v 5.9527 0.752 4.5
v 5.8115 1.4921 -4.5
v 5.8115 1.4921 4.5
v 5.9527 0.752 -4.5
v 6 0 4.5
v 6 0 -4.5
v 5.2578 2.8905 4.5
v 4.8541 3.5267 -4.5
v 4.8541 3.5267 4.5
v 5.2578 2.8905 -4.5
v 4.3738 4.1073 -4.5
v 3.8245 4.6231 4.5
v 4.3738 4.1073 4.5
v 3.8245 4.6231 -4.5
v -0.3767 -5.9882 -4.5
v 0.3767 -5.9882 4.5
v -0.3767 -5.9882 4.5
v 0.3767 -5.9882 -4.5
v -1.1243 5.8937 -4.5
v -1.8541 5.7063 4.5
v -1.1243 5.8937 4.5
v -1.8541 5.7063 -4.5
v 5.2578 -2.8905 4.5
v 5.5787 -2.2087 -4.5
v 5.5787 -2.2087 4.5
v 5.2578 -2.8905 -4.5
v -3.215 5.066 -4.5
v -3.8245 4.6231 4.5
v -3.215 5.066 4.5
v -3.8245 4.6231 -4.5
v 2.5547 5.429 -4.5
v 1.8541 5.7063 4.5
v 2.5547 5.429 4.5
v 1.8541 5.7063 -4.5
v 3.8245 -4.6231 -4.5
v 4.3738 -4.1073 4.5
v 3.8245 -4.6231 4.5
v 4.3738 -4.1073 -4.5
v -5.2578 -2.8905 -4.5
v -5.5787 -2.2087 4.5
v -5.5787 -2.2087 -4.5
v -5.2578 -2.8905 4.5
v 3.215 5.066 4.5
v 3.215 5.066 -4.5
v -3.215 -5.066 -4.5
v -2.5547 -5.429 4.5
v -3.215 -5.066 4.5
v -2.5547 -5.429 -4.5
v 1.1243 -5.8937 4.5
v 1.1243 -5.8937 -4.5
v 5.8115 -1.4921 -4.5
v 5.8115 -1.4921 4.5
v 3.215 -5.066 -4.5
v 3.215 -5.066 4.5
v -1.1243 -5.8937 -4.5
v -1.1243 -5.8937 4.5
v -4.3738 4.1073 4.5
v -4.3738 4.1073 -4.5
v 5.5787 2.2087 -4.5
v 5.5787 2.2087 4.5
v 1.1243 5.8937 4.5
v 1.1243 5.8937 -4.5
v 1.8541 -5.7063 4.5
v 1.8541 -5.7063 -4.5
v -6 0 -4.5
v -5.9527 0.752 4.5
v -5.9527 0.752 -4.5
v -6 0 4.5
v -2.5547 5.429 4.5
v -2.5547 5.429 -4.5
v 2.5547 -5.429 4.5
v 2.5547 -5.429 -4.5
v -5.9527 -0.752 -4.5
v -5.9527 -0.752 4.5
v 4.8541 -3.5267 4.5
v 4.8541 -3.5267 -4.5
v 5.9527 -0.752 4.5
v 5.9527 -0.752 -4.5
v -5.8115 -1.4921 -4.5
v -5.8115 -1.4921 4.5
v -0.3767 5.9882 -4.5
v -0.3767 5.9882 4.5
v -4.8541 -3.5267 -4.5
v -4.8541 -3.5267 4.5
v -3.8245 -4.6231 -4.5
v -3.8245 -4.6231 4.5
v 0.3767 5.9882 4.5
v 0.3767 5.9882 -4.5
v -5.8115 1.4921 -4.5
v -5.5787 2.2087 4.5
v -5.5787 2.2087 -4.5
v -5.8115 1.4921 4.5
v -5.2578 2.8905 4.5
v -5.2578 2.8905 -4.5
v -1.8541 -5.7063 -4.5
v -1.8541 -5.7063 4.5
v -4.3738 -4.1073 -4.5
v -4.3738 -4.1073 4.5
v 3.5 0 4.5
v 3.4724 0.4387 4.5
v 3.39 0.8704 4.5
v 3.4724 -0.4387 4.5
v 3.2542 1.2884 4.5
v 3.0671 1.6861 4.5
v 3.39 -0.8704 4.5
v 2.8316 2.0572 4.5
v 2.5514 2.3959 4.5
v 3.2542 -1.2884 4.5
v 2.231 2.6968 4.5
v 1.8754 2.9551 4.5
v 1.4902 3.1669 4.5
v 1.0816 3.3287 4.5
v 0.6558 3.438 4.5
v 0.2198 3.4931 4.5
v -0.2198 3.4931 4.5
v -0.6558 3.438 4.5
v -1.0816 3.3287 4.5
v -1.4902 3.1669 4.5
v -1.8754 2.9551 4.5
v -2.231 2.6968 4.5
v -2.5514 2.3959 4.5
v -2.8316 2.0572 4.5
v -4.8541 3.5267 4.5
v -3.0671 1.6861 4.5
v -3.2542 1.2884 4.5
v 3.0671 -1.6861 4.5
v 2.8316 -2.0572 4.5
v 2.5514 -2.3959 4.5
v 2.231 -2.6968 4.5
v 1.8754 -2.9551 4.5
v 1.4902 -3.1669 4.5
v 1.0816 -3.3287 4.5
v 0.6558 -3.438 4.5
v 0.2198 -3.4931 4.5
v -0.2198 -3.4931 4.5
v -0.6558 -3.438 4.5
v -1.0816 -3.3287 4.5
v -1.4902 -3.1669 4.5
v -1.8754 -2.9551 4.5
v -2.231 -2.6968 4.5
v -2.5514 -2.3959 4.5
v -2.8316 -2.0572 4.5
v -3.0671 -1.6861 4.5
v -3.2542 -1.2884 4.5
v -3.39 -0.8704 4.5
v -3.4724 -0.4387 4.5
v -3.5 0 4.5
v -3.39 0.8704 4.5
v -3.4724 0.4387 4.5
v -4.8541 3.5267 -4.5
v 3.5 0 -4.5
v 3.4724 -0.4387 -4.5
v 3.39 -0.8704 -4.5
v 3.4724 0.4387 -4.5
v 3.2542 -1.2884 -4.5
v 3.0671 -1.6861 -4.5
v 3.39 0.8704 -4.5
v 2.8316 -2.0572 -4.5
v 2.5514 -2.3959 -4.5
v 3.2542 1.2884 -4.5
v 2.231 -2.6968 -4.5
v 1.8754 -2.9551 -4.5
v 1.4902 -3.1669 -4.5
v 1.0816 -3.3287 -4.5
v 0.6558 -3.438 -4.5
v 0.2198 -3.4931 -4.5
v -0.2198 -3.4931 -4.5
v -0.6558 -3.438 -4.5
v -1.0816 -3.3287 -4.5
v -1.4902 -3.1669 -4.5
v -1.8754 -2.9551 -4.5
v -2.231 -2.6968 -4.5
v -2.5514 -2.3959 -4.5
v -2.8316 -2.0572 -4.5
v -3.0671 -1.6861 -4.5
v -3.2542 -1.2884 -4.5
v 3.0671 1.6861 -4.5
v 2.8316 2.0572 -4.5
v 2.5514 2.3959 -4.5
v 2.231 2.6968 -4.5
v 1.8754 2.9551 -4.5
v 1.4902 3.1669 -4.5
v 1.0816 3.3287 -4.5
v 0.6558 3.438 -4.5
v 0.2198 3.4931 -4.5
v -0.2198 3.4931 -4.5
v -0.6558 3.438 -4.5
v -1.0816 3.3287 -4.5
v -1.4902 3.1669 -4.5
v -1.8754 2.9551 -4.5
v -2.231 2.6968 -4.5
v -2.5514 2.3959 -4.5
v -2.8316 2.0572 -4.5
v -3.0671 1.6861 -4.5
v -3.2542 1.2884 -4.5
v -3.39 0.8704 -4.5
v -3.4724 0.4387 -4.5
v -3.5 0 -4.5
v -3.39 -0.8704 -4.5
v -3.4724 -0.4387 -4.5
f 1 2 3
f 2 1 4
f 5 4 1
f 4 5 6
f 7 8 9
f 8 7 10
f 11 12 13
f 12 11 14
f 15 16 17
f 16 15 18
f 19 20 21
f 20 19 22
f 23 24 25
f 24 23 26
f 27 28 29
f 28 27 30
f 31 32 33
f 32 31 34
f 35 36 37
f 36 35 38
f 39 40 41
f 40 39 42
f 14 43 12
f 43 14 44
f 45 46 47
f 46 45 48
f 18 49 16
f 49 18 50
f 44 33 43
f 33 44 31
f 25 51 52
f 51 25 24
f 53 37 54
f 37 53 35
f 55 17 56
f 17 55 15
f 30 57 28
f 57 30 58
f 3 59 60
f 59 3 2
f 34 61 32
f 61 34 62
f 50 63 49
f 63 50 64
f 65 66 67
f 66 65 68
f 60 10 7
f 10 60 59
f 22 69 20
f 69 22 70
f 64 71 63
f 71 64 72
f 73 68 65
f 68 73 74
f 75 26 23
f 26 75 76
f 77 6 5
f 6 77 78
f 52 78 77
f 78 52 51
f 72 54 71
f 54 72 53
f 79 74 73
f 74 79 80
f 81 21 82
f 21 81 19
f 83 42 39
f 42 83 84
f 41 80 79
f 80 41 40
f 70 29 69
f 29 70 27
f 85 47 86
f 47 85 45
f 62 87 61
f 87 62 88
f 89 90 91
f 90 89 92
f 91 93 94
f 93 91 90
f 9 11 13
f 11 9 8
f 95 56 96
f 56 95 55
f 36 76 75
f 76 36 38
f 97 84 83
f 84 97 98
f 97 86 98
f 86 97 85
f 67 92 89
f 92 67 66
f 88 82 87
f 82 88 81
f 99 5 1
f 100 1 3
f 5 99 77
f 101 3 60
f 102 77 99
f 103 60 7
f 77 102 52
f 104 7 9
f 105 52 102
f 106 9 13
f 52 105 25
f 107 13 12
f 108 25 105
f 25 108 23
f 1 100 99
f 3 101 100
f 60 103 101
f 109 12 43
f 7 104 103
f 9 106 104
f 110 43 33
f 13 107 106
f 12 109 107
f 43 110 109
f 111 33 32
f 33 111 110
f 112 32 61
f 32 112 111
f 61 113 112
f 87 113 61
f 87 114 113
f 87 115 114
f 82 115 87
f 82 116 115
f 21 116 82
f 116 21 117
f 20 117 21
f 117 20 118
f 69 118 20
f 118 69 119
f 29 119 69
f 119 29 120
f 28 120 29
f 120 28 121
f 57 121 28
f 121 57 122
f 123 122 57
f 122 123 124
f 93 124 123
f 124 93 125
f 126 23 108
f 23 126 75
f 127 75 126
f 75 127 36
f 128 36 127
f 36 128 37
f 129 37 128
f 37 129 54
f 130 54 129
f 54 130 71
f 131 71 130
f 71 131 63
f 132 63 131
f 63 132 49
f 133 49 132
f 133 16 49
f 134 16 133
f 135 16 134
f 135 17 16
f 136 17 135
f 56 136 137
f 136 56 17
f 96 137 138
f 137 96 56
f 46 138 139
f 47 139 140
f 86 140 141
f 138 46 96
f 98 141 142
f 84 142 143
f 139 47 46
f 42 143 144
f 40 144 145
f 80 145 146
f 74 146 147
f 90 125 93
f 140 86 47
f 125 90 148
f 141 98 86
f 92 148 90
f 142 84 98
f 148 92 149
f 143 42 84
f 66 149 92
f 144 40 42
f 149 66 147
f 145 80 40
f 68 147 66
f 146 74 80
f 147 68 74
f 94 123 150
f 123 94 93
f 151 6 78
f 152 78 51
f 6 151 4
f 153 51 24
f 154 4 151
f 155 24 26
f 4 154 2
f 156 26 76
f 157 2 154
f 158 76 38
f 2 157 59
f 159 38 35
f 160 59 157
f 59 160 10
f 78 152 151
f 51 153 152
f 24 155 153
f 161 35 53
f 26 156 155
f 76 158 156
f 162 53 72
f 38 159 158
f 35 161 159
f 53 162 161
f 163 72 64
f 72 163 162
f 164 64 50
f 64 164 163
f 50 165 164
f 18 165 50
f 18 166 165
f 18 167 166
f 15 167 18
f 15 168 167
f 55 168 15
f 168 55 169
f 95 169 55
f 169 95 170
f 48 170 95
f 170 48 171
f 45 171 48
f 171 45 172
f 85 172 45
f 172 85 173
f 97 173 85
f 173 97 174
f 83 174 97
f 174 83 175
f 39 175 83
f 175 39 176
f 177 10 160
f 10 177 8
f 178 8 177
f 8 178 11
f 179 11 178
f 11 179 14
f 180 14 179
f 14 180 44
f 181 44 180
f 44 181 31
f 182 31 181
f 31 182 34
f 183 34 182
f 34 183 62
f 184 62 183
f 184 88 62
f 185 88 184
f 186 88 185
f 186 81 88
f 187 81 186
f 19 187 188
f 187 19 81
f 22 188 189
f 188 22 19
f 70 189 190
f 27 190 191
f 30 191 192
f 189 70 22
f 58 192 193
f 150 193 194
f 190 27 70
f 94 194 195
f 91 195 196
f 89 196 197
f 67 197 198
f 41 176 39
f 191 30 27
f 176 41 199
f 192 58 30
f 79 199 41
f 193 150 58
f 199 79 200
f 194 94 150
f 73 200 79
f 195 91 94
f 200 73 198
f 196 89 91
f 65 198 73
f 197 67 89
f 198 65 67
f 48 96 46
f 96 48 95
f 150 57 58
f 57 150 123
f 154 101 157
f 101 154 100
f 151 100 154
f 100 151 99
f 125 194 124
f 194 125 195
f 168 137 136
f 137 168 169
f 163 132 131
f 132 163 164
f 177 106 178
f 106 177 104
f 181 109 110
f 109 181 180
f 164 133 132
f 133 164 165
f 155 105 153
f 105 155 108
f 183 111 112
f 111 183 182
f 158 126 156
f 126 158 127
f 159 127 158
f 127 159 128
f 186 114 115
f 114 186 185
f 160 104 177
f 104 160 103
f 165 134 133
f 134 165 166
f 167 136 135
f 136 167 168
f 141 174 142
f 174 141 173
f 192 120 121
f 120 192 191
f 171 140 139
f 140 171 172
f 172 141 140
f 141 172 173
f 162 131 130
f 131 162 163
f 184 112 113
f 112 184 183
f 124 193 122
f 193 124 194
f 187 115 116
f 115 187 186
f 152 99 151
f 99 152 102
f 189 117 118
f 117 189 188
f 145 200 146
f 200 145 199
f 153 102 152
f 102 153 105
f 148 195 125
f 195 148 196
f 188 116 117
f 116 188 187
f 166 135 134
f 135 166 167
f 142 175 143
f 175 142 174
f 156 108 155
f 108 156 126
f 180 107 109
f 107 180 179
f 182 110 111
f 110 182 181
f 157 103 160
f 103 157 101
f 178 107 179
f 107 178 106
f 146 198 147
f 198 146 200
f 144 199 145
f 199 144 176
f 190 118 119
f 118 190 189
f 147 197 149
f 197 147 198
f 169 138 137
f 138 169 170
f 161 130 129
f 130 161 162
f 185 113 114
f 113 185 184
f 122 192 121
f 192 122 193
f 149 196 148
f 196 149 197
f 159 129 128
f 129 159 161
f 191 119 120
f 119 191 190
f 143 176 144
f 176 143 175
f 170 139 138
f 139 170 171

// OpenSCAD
$fn = 50;


difference() {
	union() {
		translate(v = [0, 0, -4.5000000000]) {
			cylinder(h = 9, r = 6.0000000000);
		}
	}
	union() {
		translate(v = [0, 0, -100.0000000000]) {
			cylinder(h = 200, r = 3.5000000000);
		}
	}
}
